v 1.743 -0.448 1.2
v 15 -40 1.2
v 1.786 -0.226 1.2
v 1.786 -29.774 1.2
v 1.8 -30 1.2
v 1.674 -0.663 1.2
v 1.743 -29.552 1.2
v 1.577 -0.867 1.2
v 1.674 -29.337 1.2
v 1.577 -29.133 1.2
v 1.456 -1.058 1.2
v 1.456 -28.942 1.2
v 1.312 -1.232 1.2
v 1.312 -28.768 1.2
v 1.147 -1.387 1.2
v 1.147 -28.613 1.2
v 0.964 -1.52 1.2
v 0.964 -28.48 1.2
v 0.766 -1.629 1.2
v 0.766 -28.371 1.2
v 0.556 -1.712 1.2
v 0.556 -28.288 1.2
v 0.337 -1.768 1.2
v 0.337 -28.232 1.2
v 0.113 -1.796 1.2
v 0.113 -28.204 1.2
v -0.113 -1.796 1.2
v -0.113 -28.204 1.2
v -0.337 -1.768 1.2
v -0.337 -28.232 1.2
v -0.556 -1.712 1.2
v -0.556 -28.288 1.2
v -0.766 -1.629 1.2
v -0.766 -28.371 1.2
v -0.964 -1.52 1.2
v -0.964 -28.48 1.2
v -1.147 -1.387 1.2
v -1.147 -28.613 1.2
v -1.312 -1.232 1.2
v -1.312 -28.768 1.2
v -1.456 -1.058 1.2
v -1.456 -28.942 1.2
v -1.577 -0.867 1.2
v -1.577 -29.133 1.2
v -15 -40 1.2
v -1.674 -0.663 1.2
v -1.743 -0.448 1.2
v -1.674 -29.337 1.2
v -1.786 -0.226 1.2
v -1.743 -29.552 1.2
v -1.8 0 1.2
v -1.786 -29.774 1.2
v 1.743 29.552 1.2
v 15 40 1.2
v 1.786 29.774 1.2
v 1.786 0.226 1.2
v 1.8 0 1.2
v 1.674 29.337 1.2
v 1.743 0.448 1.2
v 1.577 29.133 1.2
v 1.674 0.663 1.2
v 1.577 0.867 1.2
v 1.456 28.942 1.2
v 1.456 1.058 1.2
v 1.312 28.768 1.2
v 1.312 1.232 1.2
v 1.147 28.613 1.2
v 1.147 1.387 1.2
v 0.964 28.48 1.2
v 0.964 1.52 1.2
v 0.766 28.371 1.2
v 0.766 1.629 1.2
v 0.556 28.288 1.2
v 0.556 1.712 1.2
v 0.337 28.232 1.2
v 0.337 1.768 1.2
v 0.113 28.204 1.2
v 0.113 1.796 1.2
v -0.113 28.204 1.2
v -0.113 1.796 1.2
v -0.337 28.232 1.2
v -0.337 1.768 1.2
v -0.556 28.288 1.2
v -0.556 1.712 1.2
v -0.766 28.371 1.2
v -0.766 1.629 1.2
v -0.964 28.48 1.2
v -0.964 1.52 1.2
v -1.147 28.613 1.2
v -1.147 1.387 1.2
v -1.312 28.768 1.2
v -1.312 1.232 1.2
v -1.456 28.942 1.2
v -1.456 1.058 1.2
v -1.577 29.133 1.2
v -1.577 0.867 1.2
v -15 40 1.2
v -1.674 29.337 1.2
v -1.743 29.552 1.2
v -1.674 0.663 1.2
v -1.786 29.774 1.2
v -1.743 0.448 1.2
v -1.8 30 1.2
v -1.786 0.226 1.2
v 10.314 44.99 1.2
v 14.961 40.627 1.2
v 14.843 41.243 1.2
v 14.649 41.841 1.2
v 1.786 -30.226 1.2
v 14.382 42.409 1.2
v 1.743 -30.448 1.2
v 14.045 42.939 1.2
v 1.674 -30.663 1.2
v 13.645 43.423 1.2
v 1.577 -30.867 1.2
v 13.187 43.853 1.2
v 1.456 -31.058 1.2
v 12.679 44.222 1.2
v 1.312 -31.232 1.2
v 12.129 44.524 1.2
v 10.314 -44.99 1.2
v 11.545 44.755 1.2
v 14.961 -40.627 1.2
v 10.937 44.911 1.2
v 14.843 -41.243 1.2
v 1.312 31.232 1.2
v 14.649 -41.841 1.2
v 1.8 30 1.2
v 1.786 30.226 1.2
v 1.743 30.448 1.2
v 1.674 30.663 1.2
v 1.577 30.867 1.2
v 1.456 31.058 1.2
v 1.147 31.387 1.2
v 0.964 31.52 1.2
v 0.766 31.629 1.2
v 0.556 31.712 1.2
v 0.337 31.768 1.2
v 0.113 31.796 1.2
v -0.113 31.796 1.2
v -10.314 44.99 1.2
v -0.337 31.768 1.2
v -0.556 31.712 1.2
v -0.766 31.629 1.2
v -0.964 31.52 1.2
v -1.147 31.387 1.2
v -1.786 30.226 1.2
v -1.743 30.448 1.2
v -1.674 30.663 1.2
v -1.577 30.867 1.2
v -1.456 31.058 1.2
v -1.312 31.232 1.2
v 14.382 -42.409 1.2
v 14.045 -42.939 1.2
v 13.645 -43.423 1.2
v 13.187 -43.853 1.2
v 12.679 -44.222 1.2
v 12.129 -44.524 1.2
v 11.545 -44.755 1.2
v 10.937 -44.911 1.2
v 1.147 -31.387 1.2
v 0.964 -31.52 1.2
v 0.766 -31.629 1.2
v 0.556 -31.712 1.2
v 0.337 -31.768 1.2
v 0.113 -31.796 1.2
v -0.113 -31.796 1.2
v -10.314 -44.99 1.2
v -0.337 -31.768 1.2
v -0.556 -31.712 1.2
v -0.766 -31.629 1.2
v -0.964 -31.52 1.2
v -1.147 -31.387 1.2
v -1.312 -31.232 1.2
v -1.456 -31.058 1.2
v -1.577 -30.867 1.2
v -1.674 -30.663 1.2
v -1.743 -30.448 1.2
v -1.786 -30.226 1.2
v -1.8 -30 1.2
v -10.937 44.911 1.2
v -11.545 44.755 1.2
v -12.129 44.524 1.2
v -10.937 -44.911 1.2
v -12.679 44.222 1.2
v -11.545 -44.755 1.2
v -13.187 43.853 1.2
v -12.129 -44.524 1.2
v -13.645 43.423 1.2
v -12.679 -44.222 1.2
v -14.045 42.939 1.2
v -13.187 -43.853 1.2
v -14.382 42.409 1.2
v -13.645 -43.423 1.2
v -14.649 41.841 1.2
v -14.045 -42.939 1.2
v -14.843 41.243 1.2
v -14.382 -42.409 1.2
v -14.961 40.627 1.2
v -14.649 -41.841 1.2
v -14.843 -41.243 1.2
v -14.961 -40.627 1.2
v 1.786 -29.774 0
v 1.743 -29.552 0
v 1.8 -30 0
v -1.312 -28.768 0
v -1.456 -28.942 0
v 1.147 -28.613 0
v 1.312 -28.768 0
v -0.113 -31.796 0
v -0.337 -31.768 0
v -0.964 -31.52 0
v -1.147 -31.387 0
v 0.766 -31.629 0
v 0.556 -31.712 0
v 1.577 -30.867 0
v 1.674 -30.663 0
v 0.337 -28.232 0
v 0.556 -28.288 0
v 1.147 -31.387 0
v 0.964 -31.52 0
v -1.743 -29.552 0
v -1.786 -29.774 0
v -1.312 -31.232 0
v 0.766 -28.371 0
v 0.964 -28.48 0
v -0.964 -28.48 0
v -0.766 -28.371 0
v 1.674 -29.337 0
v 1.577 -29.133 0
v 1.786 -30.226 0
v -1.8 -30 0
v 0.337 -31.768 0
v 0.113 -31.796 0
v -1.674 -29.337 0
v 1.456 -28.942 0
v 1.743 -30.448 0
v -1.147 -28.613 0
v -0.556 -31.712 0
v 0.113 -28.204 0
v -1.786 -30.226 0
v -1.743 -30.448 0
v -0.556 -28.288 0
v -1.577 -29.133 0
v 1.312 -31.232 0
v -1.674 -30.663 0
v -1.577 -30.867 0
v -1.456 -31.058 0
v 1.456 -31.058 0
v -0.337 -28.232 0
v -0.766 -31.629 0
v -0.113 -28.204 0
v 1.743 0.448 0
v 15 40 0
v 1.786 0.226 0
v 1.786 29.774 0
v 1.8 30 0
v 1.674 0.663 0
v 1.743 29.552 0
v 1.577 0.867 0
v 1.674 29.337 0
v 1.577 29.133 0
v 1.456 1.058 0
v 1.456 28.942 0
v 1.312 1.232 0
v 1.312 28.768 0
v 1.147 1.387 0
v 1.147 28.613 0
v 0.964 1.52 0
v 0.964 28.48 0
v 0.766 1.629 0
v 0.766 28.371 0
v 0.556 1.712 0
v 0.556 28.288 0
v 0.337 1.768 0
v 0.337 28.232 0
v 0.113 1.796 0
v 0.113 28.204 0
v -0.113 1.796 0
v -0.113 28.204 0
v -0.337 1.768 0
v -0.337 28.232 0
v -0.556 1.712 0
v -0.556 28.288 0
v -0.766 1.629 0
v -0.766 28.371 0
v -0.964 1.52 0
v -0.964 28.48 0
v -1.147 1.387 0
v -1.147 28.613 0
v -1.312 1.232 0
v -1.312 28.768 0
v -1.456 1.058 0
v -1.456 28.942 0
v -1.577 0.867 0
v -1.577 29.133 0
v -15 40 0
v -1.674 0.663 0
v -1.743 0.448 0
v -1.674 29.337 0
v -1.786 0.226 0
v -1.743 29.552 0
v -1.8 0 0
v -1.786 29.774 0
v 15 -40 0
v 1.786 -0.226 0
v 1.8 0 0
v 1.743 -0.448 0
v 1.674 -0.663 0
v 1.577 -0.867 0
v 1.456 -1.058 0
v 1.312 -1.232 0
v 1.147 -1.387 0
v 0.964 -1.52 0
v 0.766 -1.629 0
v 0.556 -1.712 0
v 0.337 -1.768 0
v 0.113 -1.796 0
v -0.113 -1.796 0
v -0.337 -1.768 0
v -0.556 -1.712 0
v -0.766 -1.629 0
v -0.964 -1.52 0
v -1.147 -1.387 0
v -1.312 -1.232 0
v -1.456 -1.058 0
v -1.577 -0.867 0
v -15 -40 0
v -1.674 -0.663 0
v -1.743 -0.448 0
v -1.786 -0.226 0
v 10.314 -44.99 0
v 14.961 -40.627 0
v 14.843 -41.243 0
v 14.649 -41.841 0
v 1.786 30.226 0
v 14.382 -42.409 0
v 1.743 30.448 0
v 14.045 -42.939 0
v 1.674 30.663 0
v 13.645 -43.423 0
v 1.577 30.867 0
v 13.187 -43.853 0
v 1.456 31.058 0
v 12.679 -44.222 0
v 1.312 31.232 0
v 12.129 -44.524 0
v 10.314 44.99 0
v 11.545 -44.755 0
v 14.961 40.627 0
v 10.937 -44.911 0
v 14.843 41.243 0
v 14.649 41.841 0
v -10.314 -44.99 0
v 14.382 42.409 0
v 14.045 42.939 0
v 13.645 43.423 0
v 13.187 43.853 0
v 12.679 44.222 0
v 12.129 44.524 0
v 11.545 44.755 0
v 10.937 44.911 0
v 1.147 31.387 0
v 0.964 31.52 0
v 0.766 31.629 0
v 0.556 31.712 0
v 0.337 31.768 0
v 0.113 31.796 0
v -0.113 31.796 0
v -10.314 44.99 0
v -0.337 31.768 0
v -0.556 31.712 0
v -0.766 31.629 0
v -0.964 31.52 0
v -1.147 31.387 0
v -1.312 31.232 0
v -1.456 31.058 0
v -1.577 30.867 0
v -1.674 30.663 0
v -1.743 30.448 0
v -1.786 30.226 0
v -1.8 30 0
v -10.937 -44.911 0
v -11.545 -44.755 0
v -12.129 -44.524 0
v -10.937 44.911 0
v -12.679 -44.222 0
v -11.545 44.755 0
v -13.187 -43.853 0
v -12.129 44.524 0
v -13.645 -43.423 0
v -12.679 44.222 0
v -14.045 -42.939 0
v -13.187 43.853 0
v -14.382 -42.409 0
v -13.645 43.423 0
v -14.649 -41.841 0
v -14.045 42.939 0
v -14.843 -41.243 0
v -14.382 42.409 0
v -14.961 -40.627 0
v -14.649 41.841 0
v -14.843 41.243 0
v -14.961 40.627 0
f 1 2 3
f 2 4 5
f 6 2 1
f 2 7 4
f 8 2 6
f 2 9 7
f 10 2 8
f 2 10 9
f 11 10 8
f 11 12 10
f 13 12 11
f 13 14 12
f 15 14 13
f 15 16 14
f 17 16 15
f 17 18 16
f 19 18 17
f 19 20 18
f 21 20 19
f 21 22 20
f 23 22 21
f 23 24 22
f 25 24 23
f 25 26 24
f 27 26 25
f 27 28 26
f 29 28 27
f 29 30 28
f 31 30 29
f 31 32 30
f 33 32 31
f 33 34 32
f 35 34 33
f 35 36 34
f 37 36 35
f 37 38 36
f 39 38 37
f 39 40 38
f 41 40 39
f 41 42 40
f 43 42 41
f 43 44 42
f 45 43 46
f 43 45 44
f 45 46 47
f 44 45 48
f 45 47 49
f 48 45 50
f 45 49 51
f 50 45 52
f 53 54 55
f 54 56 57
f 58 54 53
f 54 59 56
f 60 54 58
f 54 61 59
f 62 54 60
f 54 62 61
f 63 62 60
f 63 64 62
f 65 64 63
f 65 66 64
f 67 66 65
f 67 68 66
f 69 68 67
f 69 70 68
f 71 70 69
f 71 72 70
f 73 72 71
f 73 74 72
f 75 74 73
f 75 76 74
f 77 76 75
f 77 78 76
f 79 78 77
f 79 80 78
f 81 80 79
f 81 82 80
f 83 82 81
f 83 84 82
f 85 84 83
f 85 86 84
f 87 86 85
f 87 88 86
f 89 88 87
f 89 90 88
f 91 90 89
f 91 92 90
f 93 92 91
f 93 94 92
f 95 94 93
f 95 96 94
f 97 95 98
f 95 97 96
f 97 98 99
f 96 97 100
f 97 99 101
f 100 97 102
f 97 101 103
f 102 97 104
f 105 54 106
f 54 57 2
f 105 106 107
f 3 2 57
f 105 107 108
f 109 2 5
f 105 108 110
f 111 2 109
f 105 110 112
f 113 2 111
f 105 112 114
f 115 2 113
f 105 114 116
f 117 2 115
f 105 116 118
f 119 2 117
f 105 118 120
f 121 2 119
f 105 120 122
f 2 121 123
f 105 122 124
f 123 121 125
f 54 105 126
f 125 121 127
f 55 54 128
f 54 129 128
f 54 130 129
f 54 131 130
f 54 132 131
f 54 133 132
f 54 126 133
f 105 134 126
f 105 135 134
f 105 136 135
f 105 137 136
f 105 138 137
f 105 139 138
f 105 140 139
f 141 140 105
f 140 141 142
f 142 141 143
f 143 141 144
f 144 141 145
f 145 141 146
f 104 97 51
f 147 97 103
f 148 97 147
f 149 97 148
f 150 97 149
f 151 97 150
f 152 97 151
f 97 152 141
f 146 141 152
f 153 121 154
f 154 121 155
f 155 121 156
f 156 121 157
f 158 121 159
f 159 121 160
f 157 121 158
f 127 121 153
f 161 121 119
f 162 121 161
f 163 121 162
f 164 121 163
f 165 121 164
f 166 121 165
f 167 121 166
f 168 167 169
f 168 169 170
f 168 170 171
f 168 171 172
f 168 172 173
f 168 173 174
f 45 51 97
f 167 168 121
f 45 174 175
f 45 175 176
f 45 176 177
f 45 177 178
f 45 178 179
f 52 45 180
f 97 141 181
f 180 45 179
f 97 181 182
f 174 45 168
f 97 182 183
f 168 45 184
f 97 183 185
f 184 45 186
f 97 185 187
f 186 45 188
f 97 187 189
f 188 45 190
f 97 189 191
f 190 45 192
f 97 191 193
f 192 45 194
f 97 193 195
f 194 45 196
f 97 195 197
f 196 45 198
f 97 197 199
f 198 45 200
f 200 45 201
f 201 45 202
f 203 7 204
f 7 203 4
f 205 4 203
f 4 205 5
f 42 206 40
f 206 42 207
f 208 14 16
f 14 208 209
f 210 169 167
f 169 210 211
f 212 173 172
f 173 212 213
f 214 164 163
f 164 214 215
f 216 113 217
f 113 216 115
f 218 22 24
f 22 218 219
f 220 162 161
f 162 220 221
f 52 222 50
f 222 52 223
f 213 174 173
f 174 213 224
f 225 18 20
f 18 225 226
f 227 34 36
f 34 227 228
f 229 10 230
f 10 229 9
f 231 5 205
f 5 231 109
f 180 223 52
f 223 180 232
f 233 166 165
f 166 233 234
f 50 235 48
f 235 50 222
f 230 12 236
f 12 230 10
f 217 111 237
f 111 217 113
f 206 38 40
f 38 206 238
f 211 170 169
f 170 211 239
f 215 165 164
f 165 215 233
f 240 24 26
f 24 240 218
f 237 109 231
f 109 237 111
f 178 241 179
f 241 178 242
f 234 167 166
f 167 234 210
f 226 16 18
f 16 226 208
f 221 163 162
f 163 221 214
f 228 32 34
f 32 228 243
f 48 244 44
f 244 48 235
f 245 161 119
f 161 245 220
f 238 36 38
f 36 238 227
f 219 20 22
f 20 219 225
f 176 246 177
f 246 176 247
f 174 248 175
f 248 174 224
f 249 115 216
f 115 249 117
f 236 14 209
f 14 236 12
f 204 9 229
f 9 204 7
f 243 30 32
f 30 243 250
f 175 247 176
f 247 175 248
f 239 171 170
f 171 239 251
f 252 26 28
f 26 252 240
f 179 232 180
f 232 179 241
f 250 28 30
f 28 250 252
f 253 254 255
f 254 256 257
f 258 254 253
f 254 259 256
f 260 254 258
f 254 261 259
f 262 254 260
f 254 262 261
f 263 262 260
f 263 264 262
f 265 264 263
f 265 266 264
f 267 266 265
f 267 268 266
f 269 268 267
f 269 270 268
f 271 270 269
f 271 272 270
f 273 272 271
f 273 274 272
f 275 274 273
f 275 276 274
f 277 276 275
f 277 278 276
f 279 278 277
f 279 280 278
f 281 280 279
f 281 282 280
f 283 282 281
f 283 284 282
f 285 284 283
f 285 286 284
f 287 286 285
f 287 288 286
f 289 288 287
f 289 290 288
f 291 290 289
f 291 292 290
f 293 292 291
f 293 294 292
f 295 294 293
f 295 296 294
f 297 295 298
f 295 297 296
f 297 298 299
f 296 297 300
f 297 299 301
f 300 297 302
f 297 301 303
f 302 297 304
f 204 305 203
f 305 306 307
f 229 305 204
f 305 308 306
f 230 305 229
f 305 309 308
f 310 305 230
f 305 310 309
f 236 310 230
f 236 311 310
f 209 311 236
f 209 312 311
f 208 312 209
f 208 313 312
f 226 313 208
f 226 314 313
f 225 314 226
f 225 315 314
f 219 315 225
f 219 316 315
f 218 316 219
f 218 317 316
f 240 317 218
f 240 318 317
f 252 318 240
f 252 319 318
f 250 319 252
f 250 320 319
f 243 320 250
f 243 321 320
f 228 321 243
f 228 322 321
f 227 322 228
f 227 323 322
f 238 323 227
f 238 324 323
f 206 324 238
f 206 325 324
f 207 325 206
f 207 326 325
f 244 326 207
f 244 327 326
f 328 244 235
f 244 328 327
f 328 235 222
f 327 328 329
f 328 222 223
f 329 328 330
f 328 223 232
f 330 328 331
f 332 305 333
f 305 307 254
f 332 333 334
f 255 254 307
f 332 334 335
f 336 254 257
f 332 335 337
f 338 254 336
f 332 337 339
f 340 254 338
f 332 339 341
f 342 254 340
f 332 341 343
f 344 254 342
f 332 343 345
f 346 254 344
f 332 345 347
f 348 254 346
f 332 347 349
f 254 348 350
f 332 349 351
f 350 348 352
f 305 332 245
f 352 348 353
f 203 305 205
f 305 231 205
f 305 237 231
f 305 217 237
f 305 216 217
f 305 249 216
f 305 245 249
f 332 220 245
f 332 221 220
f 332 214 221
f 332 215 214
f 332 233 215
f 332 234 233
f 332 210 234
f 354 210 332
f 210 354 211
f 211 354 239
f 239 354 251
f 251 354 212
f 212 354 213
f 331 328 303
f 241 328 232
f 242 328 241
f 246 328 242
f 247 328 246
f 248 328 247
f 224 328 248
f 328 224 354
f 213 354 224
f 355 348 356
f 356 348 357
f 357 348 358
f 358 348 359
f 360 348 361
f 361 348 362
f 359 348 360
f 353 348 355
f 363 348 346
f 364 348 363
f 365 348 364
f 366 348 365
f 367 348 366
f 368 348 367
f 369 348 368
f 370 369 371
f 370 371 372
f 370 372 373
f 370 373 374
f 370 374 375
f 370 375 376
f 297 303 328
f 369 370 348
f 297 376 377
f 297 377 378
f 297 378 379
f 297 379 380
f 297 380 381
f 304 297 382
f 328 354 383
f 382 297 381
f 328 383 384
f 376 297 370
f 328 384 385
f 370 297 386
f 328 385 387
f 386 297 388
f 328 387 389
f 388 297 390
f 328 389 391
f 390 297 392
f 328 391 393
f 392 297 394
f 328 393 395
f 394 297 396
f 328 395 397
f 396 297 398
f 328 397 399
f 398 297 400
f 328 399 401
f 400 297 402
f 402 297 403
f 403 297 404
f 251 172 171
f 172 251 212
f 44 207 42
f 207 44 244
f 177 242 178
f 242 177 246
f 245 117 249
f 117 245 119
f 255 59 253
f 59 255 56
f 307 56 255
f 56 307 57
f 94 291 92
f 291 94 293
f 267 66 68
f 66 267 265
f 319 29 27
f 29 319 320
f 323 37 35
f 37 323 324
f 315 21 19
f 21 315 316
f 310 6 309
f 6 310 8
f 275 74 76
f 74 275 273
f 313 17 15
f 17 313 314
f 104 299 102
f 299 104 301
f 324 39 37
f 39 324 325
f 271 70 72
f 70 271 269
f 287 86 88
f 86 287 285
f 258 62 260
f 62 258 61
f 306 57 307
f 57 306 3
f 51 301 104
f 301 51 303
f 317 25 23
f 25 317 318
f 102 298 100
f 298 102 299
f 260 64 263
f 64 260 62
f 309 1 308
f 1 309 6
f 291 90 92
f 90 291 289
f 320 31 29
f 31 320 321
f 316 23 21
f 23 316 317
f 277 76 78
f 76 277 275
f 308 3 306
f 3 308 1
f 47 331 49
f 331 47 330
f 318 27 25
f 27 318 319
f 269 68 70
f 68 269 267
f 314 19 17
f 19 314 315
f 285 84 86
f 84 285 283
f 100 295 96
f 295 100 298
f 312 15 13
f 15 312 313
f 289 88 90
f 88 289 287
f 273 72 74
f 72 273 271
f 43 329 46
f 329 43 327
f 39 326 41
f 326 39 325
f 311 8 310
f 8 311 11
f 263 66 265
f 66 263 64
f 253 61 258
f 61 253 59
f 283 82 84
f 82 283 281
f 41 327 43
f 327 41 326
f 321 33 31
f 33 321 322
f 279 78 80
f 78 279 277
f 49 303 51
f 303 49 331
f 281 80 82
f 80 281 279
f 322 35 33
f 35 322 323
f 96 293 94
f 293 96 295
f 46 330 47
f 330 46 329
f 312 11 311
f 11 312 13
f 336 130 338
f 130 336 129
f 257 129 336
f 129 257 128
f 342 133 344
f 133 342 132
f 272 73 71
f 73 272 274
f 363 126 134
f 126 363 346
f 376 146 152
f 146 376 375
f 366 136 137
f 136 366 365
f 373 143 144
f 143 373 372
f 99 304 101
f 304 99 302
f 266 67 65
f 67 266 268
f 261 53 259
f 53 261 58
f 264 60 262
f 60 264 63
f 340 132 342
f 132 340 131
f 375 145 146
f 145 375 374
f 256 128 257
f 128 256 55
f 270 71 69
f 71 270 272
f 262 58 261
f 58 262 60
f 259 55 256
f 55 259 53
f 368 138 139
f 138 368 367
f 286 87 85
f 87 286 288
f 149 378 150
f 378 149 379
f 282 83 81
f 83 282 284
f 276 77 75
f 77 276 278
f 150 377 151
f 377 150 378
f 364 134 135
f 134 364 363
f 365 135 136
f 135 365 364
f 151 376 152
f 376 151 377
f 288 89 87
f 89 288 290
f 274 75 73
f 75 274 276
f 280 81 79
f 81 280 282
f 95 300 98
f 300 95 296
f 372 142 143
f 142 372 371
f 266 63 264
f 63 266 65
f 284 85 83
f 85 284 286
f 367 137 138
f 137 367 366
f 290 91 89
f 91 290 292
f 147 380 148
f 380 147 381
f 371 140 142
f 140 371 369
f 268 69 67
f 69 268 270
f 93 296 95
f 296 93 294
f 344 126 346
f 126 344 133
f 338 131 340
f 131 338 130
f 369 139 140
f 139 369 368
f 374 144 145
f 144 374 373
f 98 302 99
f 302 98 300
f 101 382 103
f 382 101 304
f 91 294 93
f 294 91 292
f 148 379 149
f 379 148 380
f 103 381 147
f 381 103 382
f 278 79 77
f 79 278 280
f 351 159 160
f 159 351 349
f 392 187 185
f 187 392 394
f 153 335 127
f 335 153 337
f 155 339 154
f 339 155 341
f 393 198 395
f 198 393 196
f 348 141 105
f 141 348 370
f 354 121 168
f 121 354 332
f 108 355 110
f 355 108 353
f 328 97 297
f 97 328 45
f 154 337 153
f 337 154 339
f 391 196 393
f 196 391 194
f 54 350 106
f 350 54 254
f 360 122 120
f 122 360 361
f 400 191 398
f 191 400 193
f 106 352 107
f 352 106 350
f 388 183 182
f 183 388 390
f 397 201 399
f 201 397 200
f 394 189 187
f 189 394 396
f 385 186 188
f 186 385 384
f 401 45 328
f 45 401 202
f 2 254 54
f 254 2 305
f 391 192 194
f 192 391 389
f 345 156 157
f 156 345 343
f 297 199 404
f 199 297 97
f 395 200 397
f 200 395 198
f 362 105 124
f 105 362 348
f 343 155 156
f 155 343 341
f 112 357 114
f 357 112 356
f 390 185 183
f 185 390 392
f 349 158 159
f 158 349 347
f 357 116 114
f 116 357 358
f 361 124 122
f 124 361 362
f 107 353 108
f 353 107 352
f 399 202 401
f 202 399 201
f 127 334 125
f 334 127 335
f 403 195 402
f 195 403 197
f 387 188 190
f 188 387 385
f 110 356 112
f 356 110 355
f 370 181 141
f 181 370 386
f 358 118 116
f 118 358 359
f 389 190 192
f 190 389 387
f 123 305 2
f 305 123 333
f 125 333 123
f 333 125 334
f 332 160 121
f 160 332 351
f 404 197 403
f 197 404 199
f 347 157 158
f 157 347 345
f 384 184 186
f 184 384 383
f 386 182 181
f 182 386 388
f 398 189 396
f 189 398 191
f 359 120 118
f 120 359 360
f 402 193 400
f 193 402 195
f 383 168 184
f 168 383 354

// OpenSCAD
$fn = 50;


difference() {
	union() {
		hull() {
			translate(v = [-10.0000000000, 40.0000000000, 0]) {
				cylinder(h = 27, r = 5);
			}
			translate(v = [10.0000000000, 40.0000000000, 0]) {
				cylinder(h = 27, r = 5);
			}
			translate(v = [-10.0000000000, -40.0000000000, 0]) {
				cylinder(h = 27, r = 5);
			}
			translate(v = [10.0000000000, -40.0000000000, 0]) {
				cylinder(h = 27, r = 5);
			}
		}
	}
	union() {
		translate(v = [0, 0, 1.2000000000]) {
			hull() {
				translate(v = [-10.0000000000, 40.0000000000, 0]) {
					cylinder(h = 25.8000000000, r = 3.8000000000);
				}
				translate(v = [10.0000000000, 40.0000000000, 0]) {
					cylinder(h = 25.8000000000, r = 3.8000000000);
				}
				translate(v = [-10.0000000000, -40.0000000000, 0]) {
					cylinder(h = 25.8000000000, r = 3.8000000000);
				}
				translate(v = [10.0000000000, -40.0000000000, 0]) {
					cylinder(h = 25.8000000000, r = 3.8000000000);
				}
			}
		}
		#translate(v = [0.0000000000, -30.0000000000, 0]) {
			cylinder(h = 1.2000000000, r = 1.8000000000);
		}
		#cylinder(h = 1.2000000000, r = 1.8000000000);
		#translate(v = [0.0000000000, 30.0000000000, 0]) {
			cylinder(h = 1.2000000000, r = 1.8000000000);
		}
		translate(v = [-250.0000000000, -250.0000000000, 1.2000000000]) {
			cube(size = [500, 500, 500]);
		}
		translate(v = [-250.0000000000, -250.0000000000, 1.2000000000]) {
			cube(size = [500, 500, 500]);
		}
		translate(v = [-250.0000000000, -250.0000000000, 1.2000000000]) {
			cube(size = [500, 500, 500]);
		}
	}
}
